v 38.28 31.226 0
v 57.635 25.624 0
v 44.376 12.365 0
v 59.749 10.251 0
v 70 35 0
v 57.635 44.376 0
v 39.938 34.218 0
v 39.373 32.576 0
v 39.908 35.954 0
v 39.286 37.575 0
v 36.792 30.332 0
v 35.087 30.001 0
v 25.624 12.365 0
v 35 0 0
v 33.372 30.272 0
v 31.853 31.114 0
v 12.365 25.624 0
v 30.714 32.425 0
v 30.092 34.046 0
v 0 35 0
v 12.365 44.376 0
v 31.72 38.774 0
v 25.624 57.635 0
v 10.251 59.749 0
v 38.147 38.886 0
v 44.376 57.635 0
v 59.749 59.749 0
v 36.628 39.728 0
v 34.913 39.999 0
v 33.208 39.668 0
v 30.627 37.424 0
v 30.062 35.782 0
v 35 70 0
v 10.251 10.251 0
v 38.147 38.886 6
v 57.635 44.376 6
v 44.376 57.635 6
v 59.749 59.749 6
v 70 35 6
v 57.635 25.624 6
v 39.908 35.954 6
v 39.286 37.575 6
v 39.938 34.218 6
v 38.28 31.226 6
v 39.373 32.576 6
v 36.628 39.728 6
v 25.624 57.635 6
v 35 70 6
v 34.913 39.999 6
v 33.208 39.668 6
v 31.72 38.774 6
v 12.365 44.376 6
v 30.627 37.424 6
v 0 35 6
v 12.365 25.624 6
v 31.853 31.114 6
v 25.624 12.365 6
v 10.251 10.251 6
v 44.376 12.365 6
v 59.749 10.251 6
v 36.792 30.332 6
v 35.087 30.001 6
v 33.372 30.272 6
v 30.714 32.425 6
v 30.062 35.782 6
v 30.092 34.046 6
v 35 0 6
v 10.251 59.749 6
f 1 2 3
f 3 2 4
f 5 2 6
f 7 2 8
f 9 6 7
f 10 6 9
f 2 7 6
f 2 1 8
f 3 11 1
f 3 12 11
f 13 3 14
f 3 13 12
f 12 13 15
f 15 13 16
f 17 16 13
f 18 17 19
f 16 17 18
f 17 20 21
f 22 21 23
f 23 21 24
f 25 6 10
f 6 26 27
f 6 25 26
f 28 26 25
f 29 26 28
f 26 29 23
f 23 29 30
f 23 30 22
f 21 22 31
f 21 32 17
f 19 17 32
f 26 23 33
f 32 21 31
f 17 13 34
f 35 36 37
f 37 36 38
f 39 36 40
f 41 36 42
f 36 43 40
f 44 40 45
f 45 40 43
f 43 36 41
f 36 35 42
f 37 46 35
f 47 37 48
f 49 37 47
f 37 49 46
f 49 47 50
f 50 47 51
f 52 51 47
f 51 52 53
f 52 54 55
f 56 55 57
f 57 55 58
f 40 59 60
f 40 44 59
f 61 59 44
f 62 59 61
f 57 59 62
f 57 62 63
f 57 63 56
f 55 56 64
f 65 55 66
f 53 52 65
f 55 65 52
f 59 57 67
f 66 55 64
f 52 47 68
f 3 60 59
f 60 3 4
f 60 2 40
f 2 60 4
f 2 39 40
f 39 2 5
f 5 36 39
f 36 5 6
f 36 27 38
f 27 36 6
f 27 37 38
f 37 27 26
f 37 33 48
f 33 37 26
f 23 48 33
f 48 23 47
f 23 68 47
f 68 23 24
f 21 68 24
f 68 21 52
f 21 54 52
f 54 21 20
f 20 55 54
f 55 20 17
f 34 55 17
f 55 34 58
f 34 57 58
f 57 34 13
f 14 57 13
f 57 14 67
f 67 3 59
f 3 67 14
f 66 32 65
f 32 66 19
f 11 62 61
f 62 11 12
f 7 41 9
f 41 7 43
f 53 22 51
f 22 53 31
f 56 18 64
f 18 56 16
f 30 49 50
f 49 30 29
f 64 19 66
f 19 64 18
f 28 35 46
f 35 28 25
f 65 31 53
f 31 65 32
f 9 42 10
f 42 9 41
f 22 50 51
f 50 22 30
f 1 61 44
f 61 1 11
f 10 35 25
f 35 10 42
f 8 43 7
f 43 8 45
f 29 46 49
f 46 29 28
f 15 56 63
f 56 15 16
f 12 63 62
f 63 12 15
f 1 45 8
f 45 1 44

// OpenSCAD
$fn = 32;

// ----------------------------------------------------------------------
// Star wheel: 8-point blunt, R35
// ----------------------------------------------------------------------

// --- parameters (mm) ---
n_points = 8;             // number of points / teeth
r_out = 35;               // tip radius
r_in = 24.5;              // root radius
bore_r = 5;               // centre bore radius
plate_t = 6;              // plate thickness, Z (extrusion height)
bore_d = 10;              // centre bore diameter

profile = [[0, 35], [12.365, 25.624], [10.251, 10.251], [25.624, 12.365], [35, 0], [44.376, 12.365], [59.749, 10.251], [57.635, 25.624], [70, 35], [57.635, 44.376], [59.749, 59.749], [44.376, 57.635], [35, 70], [25.624, 57.635], [10.251, 59.749], [12.365, 44.376]];  // primary outline, 16 points, counter clockwise
void_1 = [[39.908, 35.954], [39.286, 37.575], [38.147, 38.886], [36.628, 39.728], [34.913, 39.999], [33.208, 39.668], [31.72, 38.774], [30.627, 37.424], [30.062, 35.782], [30.092, 34.046], [30.714, 32.425], [31.853, 31.114], [33.372, 30.272], [35.087, 30.001], [36.792, 30.332], [38.28, 31.226], [39.373, 32.576], [39.938, 34.218]];  // centre bore, 18 points

// --- the one profile operation ---
difference() {
  linear_extrude(height = plate_t) polygon(points = profile);
  translate([0, 0, -1])
    linear_extrude(height = plate_t + 2) polygon(points = void_1);
}
